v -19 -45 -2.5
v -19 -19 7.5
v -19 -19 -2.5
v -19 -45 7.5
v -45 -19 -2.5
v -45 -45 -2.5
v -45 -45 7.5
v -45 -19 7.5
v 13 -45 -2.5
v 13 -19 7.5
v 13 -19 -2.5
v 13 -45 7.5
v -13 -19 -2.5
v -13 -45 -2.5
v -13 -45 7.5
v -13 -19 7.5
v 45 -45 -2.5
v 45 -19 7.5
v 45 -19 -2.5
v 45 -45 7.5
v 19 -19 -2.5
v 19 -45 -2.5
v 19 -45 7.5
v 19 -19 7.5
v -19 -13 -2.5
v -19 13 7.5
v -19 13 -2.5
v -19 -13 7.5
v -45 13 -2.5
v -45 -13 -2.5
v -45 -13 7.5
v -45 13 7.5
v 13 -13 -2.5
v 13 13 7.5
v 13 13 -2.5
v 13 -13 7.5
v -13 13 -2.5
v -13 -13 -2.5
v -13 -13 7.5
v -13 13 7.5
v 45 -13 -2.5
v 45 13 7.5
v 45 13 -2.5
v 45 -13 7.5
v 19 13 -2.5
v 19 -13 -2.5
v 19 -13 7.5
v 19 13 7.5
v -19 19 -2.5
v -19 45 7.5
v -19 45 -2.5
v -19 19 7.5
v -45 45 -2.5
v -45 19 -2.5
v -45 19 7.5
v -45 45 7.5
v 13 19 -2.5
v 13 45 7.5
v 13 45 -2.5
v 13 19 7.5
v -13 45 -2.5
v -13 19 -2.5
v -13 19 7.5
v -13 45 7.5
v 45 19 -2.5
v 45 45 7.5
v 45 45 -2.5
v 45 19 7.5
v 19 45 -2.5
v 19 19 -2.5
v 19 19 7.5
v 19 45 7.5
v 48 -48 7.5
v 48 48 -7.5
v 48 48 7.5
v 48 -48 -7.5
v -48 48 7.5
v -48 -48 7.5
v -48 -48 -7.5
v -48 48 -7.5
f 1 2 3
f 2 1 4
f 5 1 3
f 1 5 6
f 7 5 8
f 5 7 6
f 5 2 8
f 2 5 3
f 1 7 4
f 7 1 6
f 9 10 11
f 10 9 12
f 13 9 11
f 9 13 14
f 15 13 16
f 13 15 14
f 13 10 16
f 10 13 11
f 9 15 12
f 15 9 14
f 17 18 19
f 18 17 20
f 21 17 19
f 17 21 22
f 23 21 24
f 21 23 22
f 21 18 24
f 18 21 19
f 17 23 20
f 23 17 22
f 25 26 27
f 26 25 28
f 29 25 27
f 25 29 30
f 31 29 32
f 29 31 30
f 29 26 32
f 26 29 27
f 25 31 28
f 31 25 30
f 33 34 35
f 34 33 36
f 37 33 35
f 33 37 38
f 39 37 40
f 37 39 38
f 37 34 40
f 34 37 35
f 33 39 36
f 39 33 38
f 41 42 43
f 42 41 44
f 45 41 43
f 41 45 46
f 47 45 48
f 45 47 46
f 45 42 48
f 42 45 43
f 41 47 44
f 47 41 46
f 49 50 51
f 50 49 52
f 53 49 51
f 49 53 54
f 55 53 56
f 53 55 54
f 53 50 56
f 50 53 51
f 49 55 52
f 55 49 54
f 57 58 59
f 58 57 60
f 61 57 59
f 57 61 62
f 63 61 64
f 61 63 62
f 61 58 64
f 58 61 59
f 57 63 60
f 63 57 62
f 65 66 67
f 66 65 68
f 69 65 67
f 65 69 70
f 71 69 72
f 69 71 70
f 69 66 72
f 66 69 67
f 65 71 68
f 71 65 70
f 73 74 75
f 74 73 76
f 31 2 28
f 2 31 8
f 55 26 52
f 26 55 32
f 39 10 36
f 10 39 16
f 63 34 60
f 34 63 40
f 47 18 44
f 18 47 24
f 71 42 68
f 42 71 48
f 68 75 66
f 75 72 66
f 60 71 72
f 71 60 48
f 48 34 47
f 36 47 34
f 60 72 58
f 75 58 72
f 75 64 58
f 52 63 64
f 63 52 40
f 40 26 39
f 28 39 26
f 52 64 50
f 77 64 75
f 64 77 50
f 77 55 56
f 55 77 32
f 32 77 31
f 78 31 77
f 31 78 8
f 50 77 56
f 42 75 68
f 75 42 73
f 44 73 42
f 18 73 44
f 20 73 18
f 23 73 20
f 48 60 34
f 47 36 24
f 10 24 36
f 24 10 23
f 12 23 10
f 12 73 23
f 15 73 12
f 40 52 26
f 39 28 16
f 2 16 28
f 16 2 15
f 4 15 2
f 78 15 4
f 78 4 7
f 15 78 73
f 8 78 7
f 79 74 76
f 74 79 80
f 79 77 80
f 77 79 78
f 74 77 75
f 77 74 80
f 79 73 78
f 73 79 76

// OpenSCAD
$fn = 32;

// ----------------------------------------------------------------------
// Pocket plate 96 x 96 x 15
// 3 x 3 pockets 26 mm square, 10 mm deep
// ----------------------------------------------------------------------

// --- parameters (mm) ---
thickness = 15;  // plate thickness
floor_t = 5;     // material left under each pocket
pocket = 26;     // pocket side length
pitch_x = 32;    // pocket pitch along X
pitch_y = 32;    // pocket pitch along Y
cols = 3;        // pockets per row
rows = 3;        // rows of pockets

// --- derived feature positions (mm) ---
depth = thickness - floor_t;        // = 10   pocket depth, down to the floor
span_x = (cols - 1) * pitch_x;      // = 64   distance between outer pockets
span_y = (rows - 1) * pitch_y;      // = 64   distance between outer pocket rows
origin_x = -span_x / 2;             // = -32   X of the first pocket
origin_y = -span_y / 2;             // = -32   Y of the first pocket
plate = [span_x + pocket + 6, span_y + pocket + 6, thickness];  // = [96, 96, 15]   overall size: pockets plus 3 mm of wall on each side
feature_centers = [
  [origin_x + 0 * pitch_x, origin_y + 0 * pitch_y],
  [origin_x + 1 * pitch_x, origin_y + 0 * pitch_y],
  [origin_x + 2 * pitch_x, origin_y + 0 * pitch_y],
  [origin_x + 0 * pitch_x, origin_y + 1 * pitch_y],
  [origin_x + 1 * pitch_x, origin_y + 1 * pitch_y],
  [origin_x + 2 * pitch_x, origin_y + 1 * pitch_y],
  [origin_x + 0 * pitch_x, origin_y + 2 * pitch_y],
  [origin_x + 1 * pitch_x, origin_y + 2 * pitch_y],
  [origin_x + 2 * pitch_x, origin_y + 2 * pitch_y]
];   // pocket centres, used verbatim by the cutter loop

// plate outline, then one pocket per centre in feature_centers
difference() {
  cube(plate, center = true);
  for (centre = feature_centers)
    translate([centre[0] - pocket / 2, centre[1] - pocket / 2, plate[2] / 2 - depth])
      cube([pocket, pocket, depth + 1]);  // centred on the declared pocket centre
}
